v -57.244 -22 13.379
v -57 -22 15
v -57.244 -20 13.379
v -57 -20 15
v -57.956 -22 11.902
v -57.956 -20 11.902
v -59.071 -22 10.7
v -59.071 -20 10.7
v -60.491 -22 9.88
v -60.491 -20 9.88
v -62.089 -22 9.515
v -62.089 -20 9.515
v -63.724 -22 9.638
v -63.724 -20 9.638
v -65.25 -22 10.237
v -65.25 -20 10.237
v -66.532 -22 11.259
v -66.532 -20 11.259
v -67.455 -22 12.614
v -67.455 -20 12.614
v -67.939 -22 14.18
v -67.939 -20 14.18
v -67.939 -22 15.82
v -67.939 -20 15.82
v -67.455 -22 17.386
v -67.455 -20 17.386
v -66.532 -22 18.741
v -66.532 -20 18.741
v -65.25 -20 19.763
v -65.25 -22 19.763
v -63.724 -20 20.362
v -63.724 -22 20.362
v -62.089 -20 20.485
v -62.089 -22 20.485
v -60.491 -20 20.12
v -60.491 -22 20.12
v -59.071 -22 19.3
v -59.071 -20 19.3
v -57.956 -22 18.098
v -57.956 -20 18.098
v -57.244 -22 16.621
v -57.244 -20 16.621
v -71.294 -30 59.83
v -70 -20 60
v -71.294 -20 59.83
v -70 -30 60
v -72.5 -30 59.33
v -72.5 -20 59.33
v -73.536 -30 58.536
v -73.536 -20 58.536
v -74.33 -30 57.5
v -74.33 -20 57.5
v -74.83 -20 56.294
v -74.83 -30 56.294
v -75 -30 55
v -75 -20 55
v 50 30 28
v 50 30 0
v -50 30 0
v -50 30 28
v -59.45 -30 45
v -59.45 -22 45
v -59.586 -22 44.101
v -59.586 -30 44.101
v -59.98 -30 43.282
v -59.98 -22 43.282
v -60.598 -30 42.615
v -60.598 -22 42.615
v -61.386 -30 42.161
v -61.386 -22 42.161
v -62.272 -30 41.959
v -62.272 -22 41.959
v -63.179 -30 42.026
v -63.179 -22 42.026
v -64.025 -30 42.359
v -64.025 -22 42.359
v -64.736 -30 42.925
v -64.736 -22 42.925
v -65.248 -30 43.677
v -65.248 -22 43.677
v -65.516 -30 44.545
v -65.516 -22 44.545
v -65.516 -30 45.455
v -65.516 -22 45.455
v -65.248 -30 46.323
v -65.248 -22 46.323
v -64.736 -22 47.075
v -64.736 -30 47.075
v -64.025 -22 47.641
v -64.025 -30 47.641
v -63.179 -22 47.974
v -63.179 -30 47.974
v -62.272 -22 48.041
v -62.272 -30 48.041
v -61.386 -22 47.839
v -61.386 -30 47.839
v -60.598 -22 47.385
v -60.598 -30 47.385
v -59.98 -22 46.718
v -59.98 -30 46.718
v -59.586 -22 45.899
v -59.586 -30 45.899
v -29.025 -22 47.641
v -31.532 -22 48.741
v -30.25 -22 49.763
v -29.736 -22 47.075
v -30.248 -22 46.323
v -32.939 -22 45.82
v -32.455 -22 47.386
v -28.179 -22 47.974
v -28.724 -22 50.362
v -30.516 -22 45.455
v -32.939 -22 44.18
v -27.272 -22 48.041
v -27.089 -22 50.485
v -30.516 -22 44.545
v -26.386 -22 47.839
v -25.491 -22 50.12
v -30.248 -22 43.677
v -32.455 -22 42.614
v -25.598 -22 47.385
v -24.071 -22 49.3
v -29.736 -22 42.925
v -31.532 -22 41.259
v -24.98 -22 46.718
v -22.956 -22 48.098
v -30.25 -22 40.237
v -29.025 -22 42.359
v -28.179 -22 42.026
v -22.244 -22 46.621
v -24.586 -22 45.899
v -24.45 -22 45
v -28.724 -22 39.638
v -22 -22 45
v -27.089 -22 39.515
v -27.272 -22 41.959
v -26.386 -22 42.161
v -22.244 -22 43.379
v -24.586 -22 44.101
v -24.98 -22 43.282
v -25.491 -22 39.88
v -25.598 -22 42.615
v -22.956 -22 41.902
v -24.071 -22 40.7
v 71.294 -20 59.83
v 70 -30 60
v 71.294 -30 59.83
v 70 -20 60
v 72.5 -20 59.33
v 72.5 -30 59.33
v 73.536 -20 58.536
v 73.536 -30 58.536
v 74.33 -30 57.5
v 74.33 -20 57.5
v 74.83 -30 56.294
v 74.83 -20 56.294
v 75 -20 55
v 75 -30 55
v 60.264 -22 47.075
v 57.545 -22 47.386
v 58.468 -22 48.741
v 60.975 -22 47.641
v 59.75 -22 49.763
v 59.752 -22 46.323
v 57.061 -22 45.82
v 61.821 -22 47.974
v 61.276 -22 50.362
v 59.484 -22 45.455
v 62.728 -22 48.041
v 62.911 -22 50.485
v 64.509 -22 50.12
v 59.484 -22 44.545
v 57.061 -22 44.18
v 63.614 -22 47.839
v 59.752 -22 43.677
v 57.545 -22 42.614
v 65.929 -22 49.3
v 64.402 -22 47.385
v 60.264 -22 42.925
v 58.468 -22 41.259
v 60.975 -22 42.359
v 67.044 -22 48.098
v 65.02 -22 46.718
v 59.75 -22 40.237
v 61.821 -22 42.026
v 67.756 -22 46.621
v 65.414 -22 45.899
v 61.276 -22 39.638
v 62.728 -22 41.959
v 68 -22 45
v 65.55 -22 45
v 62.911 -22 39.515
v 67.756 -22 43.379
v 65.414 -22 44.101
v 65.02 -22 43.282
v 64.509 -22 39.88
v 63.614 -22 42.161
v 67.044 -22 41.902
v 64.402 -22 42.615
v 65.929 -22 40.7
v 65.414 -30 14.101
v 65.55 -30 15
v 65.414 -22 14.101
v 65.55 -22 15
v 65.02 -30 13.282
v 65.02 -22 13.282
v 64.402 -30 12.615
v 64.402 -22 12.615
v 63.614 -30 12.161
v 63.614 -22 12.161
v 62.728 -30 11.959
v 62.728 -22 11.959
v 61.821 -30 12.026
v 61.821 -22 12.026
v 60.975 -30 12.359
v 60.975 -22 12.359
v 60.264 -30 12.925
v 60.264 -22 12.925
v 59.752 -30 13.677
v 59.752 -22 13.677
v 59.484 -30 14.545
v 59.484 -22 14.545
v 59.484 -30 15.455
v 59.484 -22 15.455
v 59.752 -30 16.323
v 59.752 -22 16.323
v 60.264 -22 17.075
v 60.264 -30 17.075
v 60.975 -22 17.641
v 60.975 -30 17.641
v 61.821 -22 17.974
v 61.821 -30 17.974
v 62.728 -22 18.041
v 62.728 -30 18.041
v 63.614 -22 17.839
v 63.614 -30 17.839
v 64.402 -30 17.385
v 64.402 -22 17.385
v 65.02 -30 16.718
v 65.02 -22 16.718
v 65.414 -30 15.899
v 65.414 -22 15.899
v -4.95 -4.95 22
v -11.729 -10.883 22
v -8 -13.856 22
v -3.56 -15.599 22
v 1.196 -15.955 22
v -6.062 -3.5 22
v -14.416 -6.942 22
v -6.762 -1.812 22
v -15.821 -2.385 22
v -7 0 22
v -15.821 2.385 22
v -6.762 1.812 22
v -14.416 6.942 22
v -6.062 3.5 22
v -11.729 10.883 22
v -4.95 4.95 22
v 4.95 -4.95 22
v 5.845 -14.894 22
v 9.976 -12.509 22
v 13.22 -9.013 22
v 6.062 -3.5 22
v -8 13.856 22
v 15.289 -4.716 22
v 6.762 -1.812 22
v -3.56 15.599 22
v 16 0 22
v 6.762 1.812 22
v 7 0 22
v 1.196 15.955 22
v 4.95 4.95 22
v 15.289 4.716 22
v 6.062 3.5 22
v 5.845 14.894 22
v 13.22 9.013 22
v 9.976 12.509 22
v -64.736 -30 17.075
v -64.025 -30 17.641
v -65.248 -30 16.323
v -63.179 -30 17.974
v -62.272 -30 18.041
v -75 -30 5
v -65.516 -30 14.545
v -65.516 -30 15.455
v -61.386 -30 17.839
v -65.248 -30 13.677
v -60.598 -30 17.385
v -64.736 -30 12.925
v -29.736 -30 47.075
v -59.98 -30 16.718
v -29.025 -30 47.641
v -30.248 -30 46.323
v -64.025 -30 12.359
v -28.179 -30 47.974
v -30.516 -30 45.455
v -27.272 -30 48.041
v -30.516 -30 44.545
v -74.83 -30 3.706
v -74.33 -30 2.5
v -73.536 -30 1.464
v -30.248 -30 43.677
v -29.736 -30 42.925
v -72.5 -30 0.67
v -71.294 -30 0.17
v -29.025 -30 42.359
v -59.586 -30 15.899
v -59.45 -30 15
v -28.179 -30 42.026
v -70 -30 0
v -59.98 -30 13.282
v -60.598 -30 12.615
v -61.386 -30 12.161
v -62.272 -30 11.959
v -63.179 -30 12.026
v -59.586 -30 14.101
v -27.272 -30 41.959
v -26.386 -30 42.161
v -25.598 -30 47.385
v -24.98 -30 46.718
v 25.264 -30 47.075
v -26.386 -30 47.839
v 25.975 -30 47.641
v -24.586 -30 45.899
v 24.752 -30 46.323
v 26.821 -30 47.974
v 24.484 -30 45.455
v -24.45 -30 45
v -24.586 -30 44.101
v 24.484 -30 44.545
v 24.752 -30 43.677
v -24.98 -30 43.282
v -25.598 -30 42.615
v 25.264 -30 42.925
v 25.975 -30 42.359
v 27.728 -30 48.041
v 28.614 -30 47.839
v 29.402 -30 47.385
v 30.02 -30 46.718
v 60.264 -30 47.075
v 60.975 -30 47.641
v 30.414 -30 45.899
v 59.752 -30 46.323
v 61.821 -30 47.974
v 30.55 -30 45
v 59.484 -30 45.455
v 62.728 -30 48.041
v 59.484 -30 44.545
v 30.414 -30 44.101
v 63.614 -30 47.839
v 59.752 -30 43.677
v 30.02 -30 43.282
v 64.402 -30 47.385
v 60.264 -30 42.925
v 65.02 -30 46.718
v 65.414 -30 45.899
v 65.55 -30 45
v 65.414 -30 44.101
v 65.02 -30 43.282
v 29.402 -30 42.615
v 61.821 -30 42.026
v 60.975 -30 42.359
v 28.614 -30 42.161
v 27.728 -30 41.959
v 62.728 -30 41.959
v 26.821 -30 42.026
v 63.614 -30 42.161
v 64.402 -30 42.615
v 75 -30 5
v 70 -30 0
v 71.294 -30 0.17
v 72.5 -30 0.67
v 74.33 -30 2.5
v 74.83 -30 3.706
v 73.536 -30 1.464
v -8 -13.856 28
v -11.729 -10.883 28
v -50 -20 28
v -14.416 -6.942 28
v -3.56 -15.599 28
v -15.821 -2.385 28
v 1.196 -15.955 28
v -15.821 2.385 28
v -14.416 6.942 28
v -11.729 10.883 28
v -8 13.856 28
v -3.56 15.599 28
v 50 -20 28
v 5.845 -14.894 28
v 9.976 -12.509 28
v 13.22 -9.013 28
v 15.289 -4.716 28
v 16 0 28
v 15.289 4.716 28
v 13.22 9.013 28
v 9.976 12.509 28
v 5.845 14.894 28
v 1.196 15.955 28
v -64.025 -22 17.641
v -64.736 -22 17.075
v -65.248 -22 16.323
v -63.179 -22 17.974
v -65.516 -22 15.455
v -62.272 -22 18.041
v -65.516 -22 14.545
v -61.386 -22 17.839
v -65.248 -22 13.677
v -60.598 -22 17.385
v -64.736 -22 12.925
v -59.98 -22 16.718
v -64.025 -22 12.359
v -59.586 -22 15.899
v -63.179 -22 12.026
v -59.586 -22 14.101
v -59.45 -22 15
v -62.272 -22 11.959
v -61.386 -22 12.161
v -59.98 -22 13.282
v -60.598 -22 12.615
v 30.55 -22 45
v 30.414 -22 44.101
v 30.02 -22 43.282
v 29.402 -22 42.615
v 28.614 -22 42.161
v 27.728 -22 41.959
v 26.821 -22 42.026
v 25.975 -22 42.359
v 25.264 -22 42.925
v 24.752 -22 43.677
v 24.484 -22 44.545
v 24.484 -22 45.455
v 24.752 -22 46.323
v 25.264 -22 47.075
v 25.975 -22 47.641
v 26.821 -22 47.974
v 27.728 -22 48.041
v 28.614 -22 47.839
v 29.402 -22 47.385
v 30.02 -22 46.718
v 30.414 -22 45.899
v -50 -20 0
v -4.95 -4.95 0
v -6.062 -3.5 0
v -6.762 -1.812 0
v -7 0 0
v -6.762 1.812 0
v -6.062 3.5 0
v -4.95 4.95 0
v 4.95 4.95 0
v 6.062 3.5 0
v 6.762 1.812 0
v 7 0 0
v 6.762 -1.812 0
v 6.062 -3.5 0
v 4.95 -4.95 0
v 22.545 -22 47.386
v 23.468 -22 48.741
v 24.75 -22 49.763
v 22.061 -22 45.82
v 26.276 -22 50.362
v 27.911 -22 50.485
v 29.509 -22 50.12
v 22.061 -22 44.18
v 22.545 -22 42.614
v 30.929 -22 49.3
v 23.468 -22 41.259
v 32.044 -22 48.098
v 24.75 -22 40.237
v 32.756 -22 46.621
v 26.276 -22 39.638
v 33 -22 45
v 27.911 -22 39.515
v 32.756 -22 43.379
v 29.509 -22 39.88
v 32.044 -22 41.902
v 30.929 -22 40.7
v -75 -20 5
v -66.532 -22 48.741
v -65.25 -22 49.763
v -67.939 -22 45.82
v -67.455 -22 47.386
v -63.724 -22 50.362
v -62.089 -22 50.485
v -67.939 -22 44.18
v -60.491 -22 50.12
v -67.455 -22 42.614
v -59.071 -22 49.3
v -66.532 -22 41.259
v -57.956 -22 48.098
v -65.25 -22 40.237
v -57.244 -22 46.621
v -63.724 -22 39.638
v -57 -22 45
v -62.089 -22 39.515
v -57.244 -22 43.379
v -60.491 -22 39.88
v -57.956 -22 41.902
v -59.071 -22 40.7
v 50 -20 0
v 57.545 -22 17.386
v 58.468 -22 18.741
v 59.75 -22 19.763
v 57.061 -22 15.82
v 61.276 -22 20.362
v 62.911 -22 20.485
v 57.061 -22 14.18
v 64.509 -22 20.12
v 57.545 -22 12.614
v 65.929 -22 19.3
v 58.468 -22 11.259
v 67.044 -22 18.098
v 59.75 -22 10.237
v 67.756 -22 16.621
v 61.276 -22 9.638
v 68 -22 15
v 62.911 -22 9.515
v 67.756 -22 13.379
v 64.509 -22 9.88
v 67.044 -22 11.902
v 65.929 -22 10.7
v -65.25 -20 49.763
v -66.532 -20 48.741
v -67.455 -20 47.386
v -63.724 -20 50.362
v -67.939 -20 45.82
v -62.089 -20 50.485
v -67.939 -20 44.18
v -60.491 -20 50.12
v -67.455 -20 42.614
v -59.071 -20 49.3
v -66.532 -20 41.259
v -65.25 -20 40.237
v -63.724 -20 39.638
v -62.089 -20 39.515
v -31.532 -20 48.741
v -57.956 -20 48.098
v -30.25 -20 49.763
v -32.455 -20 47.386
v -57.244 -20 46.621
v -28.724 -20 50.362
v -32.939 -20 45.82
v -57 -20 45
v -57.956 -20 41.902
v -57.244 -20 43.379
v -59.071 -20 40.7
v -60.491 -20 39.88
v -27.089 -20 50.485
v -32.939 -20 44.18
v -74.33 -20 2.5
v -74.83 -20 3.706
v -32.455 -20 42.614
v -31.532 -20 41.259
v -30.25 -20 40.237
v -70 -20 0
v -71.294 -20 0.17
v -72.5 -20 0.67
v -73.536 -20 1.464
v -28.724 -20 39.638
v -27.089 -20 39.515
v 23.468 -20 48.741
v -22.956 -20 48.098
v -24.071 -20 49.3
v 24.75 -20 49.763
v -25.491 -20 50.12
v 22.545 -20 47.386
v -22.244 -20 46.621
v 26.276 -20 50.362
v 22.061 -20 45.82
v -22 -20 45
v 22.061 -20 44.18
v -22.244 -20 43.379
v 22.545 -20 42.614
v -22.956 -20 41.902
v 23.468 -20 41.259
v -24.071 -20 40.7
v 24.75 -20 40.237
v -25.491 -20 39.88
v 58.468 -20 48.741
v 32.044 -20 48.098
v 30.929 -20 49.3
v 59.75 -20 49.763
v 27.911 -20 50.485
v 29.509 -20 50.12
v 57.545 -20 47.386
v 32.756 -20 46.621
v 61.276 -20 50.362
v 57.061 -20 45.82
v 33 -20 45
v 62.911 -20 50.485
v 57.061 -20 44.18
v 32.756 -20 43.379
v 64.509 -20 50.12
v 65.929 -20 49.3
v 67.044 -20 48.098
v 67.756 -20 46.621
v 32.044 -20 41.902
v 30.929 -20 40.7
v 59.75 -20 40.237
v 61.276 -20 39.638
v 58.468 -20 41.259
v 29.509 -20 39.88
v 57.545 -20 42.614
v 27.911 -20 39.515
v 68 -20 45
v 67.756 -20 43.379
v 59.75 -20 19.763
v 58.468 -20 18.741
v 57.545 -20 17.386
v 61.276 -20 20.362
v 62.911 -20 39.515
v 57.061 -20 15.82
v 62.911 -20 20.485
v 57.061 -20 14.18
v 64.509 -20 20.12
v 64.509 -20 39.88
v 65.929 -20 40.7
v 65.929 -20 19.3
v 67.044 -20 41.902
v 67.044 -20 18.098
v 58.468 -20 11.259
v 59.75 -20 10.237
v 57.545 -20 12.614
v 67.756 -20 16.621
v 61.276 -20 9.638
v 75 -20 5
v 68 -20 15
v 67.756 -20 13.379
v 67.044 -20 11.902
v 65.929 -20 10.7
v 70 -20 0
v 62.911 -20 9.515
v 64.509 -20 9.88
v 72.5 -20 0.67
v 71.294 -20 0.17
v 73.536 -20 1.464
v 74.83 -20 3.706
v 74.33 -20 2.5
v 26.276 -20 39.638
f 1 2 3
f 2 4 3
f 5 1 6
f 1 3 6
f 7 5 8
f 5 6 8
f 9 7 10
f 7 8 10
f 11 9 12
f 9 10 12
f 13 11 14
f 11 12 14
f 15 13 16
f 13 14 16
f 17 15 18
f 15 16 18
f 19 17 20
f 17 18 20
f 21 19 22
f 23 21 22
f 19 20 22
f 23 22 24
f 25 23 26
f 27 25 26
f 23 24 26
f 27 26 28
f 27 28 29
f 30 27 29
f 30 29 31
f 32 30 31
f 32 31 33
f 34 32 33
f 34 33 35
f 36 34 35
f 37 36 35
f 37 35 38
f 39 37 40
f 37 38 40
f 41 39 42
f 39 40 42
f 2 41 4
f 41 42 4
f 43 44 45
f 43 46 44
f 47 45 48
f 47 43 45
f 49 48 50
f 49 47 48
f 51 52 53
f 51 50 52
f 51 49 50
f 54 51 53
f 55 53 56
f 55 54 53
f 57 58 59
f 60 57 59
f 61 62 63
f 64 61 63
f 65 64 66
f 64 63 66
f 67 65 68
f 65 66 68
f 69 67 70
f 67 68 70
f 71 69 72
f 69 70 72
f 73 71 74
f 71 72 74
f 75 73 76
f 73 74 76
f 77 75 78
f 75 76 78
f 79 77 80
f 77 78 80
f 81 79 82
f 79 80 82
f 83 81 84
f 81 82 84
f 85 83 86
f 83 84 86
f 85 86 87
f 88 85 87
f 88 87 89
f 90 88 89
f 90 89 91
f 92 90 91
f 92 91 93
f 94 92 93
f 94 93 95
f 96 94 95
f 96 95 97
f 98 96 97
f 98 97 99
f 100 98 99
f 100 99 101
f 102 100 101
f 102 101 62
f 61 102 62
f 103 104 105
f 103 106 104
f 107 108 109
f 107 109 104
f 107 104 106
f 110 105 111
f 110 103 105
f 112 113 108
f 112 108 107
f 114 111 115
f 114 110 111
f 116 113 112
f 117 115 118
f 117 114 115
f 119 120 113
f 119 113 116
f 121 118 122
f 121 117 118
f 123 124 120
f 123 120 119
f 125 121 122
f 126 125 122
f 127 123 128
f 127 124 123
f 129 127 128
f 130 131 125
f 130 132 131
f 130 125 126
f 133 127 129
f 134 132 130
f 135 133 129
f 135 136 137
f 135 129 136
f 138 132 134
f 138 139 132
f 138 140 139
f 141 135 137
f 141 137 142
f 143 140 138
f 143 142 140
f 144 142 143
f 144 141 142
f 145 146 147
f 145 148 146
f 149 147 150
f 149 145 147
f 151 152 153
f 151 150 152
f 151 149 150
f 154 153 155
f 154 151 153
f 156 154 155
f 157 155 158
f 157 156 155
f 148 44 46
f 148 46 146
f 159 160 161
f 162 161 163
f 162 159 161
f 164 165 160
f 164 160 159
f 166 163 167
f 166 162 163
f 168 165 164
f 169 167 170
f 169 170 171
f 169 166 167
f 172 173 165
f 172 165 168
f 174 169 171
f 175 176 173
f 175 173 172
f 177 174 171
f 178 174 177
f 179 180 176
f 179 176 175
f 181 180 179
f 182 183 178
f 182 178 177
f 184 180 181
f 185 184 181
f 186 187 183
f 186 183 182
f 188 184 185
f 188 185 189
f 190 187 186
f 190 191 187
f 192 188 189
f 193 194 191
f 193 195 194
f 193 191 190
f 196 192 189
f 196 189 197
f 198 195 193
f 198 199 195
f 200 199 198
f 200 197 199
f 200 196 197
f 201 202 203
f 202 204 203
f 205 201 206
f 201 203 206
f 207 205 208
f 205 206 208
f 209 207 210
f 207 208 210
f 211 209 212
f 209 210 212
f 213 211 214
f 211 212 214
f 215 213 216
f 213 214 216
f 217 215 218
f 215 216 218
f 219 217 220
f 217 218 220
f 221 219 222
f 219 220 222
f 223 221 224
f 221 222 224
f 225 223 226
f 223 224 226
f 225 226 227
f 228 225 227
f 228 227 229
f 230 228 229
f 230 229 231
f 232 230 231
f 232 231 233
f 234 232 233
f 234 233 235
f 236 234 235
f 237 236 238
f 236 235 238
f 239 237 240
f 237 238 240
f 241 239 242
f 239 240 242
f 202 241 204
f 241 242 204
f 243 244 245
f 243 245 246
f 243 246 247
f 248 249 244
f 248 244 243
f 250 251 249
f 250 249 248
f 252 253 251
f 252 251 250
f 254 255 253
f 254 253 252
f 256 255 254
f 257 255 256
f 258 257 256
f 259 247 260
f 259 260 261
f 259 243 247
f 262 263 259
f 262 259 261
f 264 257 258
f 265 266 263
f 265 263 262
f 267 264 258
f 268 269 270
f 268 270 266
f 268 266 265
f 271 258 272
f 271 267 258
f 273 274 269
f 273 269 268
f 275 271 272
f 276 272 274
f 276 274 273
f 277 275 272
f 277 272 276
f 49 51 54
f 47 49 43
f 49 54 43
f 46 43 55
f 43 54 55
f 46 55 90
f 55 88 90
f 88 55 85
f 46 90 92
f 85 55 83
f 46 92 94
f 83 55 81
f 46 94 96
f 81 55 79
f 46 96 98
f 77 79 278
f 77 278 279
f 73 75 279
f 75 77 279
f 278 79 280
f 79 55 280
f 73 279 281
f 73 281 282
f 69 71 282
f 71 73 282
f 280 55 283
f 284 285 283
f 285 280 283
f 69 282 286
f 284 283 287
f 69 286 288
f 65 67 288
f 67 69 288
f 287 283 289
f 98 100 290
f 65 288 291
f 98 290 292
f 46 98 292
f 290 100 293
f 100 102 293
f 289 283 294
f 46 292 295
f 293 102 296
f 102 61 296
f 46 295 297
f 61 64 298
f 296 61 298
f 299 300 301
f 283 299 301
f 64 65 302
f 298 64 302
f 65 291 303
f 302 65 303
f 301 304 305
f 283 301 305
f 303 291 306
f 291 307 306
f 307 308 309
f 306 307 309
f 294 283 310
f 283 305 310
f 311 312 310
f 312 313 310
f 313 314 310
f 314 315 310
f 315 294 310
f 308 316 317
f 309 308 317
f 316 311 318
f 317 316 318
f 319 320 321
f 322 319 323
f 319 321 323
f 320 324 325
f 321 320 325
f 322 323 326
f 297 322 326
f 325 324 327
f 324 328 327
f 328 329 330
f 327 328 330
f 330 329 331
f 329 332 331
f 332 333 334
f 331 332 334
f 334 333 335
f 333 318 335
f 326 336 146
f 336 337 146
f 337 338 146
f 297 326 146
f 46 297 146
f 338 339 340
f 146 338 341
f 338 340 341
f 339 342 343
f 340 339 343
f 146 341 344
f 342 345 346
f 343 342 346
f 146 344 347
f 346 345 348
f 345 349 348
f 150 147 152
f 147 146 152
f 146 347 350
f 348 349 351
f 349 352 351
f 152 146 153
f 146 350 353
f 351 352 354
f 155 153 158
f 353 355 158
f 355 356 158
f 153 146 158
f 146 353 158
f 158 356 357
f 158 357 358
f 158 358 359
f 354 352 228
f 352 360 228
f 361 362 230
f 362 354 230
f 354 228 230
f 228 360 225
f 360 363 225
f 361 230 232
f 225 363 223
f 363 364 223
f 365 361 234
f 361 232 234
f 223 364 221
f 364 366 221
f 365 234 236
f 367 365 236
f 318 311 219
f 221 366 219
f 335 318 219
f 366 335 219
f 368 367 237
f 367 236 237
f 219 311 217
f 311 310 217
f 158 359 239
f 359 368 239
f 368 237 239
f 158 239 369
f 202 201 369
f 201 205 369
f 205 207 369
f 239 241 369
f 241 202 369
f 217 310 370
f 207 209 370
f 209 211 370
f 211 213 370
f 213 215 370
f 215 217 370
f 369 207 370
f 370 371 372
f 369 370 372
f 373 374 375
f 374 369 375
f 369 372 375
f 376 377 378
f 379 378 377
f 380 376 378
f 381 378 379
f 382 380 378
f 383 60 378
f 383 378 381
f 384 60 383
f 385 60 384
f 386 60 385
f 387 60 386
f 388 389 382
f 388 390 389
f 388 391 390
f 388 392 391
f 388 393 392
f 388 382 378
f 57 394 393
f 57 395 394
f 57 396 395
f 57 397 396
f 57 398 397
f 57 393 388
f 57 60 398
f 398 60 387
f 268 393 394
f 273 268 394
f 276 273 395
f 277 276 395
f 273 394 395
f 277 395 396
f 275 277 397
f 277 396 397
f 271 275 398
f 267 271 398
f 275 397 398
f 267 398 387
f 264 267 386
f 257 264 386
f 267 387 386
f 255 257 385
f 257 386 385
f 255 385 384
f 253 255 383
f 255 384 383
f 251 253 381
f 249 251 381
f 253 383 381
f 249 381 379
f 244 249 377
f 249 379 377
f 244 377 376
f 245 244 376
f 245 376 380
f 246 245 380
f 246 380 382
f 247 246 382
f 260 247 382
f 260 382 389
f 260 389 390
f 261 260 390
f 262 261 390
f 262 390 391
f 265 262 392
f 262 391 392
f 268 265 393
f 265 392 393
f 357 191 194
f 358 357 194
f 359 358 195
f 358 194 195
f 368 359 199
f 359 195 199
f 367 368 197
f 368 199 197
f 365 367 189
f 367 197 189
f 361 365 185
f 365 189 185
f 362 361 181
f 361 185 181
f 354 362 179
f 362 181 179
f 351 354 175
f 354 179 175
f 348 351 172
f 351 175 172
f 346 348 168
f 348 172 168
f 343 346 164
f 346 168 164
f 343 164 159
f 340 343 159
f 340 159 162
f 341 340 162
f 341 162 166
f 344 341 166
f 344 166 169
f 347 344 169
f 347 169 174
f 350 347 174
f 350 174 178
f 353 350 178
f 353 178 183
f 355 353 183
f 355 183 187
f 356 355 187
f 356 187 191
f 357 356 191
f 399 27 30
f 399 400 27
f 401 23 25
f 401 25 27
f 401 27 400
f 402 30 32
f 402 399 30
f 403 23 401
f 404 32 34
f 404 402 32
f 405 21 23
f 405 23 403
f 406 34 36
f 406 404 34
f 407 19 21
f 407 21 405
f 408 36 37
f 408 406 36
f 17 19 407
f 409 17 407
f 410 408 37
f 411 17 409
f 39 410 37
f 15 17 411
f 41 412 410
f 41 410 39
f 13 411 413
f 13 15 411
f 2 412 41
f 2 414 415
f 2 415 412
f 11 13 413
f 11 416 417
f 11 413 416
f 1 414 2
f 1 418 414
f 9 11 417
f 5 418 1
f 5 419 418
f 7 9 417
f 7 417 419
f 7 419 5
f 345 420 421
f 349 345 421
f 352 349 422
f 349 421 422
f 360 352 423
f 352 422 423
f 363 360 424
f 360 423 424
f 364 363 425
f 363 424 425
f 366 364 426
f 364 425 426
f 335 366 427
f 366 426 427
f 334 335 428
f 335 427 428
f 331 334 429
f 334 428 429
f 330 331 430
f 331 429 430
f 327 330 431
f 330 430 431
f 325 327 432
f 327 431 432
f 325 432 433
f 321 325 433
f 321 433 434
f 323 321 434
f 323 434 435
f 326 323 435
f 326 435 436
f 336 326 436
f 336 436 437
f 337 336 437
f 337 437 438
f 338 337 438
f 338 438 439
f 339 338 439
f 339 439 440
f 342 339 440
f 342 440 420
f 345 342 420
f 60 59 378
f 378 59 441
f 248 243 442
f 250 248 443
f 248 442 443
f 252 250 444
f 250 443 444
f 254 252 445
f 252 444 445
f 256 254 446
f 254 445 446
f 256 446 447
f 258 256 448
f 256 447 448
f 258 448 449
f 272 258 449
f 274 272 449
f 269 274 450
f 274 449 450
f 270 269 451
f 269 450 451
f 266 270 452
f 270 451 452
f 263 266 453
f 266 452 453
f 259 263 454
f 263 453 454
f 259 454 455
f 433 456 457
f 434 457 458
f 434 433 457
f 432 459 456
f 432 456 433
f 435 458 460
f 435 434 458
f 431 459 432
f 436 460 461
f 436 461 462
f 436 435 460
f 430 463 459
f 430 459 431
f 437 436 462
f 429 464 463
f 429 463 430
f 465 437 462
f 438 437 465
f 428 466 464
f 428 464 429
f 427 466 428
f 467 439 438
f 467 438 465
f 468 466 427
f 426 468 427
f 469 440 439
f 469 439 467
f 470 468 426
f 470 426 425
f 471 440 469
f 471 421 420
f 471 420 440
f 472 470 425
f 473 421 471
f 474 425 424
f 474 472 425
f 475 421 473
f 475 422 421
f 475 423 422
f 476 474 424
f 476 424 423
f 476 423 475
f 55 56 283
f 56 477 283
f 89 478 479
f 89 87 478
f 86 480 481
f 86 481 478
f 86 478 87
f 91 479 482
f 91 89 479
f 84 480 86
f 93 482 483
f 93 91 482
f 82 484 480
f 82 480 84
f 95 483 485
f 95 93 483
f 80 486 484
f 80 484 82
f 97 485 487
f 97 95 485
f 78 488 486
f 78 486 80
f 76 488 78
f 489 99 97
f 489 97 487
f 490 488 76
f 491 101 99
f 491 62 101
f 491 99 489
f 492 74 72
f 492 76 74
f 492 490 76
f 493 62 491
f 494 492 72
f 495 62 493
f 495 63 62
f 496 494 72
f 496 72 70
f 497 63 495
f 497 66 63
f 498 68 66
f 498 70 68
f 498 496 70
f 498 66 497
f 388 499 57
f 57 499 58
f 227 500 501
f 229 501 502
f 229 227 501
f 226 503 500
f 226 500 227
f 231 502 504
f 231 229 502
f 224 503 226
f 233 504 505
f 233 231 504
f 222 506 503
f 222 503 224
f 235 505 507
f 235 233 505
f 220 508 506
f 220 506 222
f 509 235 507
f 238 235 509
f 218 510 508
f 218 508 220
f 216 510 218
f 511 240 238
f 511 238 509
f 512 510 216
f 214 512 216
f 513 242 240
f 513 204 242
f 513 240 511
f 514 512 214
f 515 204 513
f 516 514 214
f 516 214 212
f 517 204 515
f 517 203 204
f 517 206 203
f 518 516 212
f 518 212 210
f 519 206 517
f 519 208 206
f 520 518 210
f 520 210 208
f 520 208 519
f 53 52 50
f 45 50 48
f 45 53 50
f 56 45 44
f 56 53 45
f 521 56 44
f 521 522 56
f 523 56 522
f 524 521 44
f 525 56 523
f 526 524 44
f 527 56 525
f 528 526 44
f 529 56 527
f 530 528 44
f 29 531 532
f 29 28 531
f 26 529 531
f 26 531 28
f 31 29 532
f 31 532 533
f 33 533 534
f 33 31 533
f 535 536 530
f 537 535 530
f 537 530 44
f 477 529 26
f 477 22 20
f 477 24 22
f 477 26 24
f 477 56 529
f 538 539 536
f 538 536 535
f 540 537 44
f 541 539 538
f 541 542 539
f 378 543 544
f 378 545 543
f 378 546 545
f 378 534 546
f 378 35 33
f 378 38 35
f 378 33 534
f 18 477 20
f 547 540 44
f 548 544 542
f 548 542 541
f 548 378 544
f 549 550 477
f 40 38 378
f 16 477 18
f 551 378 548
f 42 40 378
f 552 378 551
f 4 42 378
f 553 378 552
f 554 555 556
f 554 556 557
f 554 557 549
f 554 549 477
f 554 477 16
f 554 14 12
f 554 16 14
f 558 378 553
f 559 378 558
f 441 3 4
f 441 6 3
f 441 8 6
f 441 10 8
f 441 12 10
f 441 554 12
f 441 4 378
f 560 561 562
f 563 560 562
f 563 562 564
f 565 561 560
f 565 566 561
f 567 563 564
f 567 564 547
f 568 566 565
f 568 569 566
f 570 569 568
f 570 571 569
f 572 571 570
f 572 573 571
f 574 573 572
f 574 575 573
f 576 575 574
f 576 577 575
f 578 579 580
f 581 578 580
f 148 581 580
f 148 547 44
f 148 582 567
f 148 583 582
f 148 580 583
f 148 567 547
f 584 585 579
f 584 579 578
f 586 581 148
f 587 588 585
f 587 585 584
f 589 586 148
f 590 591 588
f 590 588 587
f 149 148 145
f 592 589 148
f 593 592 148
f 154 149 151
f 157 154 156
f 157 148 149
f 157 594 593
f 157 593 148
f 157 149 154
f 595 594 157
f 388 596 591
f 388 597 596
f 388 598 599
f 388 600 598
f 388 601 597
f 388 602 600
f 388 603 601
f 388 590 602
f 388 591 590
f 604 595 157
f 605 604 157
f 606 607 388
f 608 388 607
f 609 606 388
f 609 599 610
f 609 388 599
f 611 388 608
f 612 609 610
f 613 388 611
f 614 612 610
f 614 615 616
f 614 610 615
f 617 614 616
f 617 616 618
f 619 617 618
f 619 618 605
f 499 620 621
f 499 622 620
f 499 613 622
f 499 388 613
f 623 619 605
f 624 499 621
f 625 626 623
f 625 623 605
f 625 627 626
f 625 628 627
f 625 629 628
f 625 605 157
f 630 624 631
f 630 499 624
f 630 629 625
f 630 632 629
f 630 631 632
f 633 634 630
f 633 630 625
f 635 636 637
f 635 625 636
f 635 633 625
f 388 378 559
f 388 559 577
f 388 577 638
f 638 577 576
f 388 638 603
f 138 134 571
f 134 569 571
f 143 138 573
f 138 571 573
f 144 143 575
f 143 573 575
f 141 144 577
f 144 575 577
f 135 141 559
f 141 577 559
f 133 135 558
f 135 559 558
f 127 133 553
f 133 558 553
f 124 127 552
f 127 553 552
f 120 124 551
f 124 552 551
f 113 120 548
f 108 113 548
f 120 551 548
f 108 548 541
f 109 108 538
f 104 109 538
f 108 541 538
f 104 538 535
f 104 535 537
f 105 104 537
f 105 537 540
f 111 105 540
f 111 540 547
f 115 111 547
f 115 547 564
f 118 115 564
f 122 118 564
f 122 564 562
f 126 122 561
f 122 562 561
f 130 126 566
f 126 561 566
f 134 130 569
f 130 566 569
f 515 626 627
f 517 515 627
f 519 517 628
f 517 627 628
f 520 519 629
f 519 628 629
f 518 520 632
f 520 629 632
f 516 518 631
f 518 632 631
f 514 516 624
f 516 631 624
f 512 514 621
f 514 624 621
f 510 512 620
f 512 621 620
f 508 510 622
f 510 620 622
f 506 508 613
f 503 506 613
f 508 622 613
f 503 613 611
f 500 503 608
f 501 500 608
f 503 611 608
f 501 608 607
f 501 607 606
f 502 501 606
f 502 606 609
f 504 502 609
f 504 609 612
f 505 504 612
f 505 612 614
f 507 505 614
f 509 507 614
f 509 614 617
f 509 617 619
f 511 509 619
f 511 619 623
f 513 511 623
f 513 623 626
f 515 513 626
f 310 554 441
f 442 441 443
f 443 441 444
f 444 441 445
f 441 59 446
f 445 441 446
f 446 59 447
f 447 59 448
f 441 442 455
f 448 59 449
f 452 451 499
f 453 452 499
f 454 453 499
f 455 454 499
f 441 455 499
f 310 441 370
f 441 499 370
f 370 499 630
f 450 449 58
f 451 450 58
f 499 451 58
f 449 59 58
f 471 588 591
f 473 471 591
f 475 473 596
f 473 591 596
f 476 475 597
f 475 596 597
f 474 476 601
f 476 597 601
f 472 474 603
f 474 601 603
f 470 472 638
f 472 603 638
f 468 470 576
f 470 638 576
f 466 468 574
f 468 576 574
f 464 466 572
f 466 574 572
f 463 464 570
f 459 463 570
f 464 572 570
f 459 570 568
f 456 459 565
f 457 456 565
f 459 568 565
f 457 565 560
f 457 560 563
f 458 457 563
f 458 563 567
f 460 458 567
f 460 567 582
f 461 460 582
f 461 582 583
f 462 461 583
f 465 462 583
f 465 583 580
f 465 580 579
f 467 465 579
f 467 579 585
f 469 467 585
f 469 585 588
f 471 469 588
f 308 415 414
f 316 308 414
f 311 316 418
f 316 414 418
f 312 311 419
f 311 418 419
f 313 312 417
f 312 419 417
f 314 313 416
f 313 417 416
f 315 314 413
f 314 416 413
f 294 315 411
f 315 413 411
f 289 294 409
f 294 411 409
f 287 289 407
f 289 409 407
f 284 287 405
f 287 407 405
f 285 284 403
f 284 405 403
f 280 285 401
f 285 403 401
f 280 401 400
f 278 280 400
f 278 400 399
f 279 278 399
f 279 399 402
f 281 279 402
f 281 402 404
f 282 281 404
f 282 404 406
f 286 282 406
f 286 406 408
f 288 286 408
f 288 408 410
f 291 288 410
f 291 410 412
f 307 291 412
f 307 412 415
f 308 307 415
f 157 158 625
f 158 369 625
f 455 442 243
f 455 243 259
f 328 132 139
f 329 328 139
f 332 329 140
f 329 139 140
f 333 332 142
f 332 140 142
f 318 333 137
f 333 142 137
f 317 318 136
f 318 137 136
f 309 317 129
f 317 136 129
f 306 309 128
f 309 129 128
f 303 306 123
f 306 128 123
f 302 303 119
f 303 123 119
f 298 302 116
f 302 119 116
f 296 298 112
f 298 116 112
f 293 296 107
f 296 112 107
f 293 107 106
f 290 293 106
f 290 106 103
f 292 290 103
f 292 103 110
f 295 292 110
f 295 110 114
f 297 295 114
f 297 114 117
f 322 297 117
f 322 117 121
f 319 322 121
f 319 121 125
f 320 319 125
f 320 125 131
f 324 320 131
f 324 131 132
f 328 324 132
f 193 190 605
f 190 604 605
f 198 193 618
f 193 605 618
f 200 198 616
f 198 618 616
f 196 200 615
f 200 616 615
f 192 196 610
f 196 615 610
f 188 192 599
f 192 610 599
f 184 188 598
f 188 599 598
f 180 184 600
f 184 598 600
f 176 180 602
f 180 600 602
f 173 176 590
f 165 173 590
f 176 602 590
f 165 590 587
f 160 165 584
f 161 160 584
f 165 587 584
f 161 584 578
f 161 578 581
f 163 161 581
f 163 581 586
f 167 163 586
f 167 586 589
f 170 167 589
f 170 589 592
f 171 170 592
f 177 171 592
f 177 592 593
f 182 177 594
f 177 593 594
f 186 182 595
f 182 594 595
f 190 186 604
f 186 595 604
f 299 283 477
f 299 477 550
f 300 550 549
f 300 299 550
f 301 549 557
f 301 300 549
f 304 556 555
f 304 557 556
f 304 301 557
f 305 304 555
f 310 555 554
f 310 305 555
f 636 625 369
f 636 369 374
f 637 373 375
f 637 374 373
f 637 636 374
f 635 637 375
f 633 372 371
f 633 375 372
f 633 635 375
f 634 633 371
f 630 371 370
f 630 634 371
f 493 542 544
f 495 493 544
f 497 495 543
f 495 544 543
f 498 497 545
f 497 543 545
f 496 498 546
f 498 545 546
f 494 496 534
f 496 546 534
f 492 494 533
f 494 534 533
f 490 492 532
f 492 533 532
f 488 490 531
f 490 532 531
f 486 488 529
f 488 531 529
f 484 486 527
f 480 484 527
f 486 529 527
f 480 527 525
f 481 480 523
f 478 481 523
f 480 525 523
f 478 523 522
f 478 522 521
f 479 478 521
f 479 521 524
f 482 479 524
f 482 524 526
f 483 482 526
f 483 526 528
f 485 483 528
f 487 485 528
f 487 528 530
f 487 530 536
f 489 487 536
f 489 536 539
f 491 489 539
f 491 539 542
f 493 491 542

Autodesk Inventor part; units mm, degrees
ref_plane "YZ Plane" through (0, 0, 0) normal (1, 0, 0) x (0, 1, 0)
ref_plane "XZ Plane" through (0, 0, 0) normal (0, 1, 0) x (-1, 0, 0)
ref_plane "XY Plane" through (0, 0, 0) normal (0, 0, 1) x (1, 0, 0)
sketch "Sketch1" plane through (0, 0, 0) normal (0, 0, 1) x (1, 0, 0)
  circle A0 centre (0, 0) radius 7
  line L0 (-4.95, 4.9495) -> (4.95, 4.9495)
  line L1 (-4.95, -4.9495) -> (4.95, -4.9495)
  line L2 (0, 0) -> (0, -30) construction
  line L3 (-75, -30) -> (75, -30)
  line L4 (75, -30) -> (75, -20)
  line L5 (75, -20) -> (-75, -20)
  line L6 (-75, -20) -> (-75, -30)
  line L7 (-75, -30) -> (75, -20) construction
  line L8 (75, -30) -> (-75, -20) construction
  line L9 (-50, -20) -> (50, -20)
  line L10 (50, -20) -> (50, 30)
  line L11 (50, 30) -> (-50, 30)
  line L12 (-50, 30) -> (-50, -20)
  point P0 (0, -25)
  dimension "d1" = 7
  dimension "d2" = 9.9
  dimension "d4" = 150
  dimension "d5" = 10
  dimension "d6" = 50
  dimension "d26" = 25
  dimension "d27" = 100
  dimension "d28" = 50
extrude "Extrusion1" add sketch "Sketch1" along normal blind 28 contours L0 A0 | A0 L1 | L6 L5 L4 L3 | L12 L11 L10 L5
sketch "Sketch2" plane through (0, 0, 28) normal (0, 0, 1) x (1, 0, 0)
  line L0 (-50, -20) -> (-75, -20) projected
  line L1 (-75, -20) -> (-75, -30) projected
  line L2 (-75, -30) -> (75, -30) projected
  line L3 (75, -30) -> (75, -20) projected
  line L4 (-50, -20) -> (50, -20)
  line L5 (75, -20) -> (50, -20) projected
  line L6 (50, -20) -> (50, 30) projected
  line L7 (50, 30) -> (-50, 30) projected
  line L8 (-50, 30) -> (-50, -20) projected
  point P0 (0, 0)
extrude "Extrusion2" add sketch "Sketch2" along normal blind 32 contours L4 L5 L3 L2 L1 L0
sketch "Sketch3" plane through (0, 0, 60) normal (0, 0, 1) x (1, 0, 0)
  circle A0 centre (0, 0) radius 16
  dimension "d11" = 32
extrude "Extrusion3" cut sketch "Sketch3" against normal blind 38
sketch "Sketch4" plane through (-75, -20, 0) normal (0, 1, 0) x (1, 0, 0)
  circle A0 centre (12.5, -15) radius 3.05
  line L0 (150, 0) -> (0, 0) projected
  circle A1 centre (12.5, -45) radius 3.05
  circle A2 centre (47.5, -45) radius 3.05
  line L1 (75, 12) -> (75, -72) projected
  circle A3 centre (137.5, -15) radius 3.05
  circle A4 centre (137.5, -45) radius 3.05
  circle A5 centre (102.5, -45) radius 3.05
  line L2 (0, 0) -> (0, -60) projected
  point P0 (75, 0)
  point P1 (25, 0)
  point P2 (12.5, 0)
  point P3 (12.5, 0)
  point P4 (12.5, 0)
  point P5 (12.5, 0)
  dimension "d14" = 6.1
  dimension "d15" = 15
  dimension "d17" = 30
  dimension "d18" = 35
extrude "Extrusion4" cut sketch "Sketch4" against normal through all
fillet "Fillet1" radius 5 4 edges at (75, -25, 60) (-75, -25, 60) (75, -25, 0) (-75, -25, 0)
sketch "Sketch5" plane through (-50, -20, 28) normal (0, 1, 0) x (1, 0, 0)
  arc A0 (-20, 28) -> (-25, 23) centre (-20, 23) ccw projected
  line L0 (-25, 23) -> (-25, -27) projected
  line L1 (0, 28) -> (-20, 28) projected
  circle A1 centre (-12.5, 13) radius 3.05 projected
  circle A2 centre (112.5, 13) radius 3.05 projected
  arc A3 (125, 23) -> (120, 28) centre (120, 23) ccw projected
  line L2 (125, 23) -> (125, -27) projected
  circle A4 centre (-12.5, 13) radius 5.5
  circle A5 centre (-12.5, -17) radius 5.5
  circle A6 centre (22.5, -17) radius 5.5
  circle A7 centre (77.5, -17) radius 5.5
  circle A8 centre (112.5, -17) radius 5.5
  circle A9 centre (112.5, 13) radius 5.5
  arc A10 (-20, 28) -> (-25, 23) centre (-20, 23) ccw projected
  line L3 (-25, 23) -> (-25, -27) projected
  arc A11 (-25, -27) -> (-20, -32) centre (-20, -27) ccw projected
  line L4 (120, -32) -> (-20, -32) projected
  arc A12 (120, -32) -> (125, -27) centre (120, -27) ccw projected
  arc A13 (-25, -27) -> (-20, -32) centre (-20, -27) ccw projected
  line L5 (120, -32) -> (-20, -32) projected
  arc A14 (120, -32) -> (125, -27) centre (120, -27) ccw projected
  line L6 (125, 23) -> (125, -27) projected
  arc A15 (125, 23) -> (120, 28) centre (120, 23) ccw projected
  circle A16 centre (-12.5, -17) radius 3.05 projected
  circle A17 centre (22.5, -17) radius 3.05 projected
  circle A18 centre (77.5, -17) radius 3.05 projected
  circle A19 centre (112.5, -17) radius 3.05 projected
  line L7 (0, 28) -> (0, 0) projected
  line L8 (0, 28) -> (-20, 28) projected
  line L9 (120, 28) -> (100, 28) projected
  line L10 (100, 28) -> (100, 0) projected
  line L11 (0, 28) -> (0, 0) projected
  line L12 (120, 28) -> (100, 28) projected
  line L13 (100, 28) -> (100, 0) projected
  line L14 (0, 0) -> (100, 0) projected
  line L15 (0, 0) -> (100, 0) projected
  point P0 (50, 28)
  dimension "d22" = 11
extrude "Extrusion5" cut sketch "Sketch5" against normal blind 2 contours A1 | A2 | A4 | A5 | A6 | A7 | A8 | A9 | A16 | A17 | A18 | A19
properties part number "motor_bracket" material "Aluminum 6061"
